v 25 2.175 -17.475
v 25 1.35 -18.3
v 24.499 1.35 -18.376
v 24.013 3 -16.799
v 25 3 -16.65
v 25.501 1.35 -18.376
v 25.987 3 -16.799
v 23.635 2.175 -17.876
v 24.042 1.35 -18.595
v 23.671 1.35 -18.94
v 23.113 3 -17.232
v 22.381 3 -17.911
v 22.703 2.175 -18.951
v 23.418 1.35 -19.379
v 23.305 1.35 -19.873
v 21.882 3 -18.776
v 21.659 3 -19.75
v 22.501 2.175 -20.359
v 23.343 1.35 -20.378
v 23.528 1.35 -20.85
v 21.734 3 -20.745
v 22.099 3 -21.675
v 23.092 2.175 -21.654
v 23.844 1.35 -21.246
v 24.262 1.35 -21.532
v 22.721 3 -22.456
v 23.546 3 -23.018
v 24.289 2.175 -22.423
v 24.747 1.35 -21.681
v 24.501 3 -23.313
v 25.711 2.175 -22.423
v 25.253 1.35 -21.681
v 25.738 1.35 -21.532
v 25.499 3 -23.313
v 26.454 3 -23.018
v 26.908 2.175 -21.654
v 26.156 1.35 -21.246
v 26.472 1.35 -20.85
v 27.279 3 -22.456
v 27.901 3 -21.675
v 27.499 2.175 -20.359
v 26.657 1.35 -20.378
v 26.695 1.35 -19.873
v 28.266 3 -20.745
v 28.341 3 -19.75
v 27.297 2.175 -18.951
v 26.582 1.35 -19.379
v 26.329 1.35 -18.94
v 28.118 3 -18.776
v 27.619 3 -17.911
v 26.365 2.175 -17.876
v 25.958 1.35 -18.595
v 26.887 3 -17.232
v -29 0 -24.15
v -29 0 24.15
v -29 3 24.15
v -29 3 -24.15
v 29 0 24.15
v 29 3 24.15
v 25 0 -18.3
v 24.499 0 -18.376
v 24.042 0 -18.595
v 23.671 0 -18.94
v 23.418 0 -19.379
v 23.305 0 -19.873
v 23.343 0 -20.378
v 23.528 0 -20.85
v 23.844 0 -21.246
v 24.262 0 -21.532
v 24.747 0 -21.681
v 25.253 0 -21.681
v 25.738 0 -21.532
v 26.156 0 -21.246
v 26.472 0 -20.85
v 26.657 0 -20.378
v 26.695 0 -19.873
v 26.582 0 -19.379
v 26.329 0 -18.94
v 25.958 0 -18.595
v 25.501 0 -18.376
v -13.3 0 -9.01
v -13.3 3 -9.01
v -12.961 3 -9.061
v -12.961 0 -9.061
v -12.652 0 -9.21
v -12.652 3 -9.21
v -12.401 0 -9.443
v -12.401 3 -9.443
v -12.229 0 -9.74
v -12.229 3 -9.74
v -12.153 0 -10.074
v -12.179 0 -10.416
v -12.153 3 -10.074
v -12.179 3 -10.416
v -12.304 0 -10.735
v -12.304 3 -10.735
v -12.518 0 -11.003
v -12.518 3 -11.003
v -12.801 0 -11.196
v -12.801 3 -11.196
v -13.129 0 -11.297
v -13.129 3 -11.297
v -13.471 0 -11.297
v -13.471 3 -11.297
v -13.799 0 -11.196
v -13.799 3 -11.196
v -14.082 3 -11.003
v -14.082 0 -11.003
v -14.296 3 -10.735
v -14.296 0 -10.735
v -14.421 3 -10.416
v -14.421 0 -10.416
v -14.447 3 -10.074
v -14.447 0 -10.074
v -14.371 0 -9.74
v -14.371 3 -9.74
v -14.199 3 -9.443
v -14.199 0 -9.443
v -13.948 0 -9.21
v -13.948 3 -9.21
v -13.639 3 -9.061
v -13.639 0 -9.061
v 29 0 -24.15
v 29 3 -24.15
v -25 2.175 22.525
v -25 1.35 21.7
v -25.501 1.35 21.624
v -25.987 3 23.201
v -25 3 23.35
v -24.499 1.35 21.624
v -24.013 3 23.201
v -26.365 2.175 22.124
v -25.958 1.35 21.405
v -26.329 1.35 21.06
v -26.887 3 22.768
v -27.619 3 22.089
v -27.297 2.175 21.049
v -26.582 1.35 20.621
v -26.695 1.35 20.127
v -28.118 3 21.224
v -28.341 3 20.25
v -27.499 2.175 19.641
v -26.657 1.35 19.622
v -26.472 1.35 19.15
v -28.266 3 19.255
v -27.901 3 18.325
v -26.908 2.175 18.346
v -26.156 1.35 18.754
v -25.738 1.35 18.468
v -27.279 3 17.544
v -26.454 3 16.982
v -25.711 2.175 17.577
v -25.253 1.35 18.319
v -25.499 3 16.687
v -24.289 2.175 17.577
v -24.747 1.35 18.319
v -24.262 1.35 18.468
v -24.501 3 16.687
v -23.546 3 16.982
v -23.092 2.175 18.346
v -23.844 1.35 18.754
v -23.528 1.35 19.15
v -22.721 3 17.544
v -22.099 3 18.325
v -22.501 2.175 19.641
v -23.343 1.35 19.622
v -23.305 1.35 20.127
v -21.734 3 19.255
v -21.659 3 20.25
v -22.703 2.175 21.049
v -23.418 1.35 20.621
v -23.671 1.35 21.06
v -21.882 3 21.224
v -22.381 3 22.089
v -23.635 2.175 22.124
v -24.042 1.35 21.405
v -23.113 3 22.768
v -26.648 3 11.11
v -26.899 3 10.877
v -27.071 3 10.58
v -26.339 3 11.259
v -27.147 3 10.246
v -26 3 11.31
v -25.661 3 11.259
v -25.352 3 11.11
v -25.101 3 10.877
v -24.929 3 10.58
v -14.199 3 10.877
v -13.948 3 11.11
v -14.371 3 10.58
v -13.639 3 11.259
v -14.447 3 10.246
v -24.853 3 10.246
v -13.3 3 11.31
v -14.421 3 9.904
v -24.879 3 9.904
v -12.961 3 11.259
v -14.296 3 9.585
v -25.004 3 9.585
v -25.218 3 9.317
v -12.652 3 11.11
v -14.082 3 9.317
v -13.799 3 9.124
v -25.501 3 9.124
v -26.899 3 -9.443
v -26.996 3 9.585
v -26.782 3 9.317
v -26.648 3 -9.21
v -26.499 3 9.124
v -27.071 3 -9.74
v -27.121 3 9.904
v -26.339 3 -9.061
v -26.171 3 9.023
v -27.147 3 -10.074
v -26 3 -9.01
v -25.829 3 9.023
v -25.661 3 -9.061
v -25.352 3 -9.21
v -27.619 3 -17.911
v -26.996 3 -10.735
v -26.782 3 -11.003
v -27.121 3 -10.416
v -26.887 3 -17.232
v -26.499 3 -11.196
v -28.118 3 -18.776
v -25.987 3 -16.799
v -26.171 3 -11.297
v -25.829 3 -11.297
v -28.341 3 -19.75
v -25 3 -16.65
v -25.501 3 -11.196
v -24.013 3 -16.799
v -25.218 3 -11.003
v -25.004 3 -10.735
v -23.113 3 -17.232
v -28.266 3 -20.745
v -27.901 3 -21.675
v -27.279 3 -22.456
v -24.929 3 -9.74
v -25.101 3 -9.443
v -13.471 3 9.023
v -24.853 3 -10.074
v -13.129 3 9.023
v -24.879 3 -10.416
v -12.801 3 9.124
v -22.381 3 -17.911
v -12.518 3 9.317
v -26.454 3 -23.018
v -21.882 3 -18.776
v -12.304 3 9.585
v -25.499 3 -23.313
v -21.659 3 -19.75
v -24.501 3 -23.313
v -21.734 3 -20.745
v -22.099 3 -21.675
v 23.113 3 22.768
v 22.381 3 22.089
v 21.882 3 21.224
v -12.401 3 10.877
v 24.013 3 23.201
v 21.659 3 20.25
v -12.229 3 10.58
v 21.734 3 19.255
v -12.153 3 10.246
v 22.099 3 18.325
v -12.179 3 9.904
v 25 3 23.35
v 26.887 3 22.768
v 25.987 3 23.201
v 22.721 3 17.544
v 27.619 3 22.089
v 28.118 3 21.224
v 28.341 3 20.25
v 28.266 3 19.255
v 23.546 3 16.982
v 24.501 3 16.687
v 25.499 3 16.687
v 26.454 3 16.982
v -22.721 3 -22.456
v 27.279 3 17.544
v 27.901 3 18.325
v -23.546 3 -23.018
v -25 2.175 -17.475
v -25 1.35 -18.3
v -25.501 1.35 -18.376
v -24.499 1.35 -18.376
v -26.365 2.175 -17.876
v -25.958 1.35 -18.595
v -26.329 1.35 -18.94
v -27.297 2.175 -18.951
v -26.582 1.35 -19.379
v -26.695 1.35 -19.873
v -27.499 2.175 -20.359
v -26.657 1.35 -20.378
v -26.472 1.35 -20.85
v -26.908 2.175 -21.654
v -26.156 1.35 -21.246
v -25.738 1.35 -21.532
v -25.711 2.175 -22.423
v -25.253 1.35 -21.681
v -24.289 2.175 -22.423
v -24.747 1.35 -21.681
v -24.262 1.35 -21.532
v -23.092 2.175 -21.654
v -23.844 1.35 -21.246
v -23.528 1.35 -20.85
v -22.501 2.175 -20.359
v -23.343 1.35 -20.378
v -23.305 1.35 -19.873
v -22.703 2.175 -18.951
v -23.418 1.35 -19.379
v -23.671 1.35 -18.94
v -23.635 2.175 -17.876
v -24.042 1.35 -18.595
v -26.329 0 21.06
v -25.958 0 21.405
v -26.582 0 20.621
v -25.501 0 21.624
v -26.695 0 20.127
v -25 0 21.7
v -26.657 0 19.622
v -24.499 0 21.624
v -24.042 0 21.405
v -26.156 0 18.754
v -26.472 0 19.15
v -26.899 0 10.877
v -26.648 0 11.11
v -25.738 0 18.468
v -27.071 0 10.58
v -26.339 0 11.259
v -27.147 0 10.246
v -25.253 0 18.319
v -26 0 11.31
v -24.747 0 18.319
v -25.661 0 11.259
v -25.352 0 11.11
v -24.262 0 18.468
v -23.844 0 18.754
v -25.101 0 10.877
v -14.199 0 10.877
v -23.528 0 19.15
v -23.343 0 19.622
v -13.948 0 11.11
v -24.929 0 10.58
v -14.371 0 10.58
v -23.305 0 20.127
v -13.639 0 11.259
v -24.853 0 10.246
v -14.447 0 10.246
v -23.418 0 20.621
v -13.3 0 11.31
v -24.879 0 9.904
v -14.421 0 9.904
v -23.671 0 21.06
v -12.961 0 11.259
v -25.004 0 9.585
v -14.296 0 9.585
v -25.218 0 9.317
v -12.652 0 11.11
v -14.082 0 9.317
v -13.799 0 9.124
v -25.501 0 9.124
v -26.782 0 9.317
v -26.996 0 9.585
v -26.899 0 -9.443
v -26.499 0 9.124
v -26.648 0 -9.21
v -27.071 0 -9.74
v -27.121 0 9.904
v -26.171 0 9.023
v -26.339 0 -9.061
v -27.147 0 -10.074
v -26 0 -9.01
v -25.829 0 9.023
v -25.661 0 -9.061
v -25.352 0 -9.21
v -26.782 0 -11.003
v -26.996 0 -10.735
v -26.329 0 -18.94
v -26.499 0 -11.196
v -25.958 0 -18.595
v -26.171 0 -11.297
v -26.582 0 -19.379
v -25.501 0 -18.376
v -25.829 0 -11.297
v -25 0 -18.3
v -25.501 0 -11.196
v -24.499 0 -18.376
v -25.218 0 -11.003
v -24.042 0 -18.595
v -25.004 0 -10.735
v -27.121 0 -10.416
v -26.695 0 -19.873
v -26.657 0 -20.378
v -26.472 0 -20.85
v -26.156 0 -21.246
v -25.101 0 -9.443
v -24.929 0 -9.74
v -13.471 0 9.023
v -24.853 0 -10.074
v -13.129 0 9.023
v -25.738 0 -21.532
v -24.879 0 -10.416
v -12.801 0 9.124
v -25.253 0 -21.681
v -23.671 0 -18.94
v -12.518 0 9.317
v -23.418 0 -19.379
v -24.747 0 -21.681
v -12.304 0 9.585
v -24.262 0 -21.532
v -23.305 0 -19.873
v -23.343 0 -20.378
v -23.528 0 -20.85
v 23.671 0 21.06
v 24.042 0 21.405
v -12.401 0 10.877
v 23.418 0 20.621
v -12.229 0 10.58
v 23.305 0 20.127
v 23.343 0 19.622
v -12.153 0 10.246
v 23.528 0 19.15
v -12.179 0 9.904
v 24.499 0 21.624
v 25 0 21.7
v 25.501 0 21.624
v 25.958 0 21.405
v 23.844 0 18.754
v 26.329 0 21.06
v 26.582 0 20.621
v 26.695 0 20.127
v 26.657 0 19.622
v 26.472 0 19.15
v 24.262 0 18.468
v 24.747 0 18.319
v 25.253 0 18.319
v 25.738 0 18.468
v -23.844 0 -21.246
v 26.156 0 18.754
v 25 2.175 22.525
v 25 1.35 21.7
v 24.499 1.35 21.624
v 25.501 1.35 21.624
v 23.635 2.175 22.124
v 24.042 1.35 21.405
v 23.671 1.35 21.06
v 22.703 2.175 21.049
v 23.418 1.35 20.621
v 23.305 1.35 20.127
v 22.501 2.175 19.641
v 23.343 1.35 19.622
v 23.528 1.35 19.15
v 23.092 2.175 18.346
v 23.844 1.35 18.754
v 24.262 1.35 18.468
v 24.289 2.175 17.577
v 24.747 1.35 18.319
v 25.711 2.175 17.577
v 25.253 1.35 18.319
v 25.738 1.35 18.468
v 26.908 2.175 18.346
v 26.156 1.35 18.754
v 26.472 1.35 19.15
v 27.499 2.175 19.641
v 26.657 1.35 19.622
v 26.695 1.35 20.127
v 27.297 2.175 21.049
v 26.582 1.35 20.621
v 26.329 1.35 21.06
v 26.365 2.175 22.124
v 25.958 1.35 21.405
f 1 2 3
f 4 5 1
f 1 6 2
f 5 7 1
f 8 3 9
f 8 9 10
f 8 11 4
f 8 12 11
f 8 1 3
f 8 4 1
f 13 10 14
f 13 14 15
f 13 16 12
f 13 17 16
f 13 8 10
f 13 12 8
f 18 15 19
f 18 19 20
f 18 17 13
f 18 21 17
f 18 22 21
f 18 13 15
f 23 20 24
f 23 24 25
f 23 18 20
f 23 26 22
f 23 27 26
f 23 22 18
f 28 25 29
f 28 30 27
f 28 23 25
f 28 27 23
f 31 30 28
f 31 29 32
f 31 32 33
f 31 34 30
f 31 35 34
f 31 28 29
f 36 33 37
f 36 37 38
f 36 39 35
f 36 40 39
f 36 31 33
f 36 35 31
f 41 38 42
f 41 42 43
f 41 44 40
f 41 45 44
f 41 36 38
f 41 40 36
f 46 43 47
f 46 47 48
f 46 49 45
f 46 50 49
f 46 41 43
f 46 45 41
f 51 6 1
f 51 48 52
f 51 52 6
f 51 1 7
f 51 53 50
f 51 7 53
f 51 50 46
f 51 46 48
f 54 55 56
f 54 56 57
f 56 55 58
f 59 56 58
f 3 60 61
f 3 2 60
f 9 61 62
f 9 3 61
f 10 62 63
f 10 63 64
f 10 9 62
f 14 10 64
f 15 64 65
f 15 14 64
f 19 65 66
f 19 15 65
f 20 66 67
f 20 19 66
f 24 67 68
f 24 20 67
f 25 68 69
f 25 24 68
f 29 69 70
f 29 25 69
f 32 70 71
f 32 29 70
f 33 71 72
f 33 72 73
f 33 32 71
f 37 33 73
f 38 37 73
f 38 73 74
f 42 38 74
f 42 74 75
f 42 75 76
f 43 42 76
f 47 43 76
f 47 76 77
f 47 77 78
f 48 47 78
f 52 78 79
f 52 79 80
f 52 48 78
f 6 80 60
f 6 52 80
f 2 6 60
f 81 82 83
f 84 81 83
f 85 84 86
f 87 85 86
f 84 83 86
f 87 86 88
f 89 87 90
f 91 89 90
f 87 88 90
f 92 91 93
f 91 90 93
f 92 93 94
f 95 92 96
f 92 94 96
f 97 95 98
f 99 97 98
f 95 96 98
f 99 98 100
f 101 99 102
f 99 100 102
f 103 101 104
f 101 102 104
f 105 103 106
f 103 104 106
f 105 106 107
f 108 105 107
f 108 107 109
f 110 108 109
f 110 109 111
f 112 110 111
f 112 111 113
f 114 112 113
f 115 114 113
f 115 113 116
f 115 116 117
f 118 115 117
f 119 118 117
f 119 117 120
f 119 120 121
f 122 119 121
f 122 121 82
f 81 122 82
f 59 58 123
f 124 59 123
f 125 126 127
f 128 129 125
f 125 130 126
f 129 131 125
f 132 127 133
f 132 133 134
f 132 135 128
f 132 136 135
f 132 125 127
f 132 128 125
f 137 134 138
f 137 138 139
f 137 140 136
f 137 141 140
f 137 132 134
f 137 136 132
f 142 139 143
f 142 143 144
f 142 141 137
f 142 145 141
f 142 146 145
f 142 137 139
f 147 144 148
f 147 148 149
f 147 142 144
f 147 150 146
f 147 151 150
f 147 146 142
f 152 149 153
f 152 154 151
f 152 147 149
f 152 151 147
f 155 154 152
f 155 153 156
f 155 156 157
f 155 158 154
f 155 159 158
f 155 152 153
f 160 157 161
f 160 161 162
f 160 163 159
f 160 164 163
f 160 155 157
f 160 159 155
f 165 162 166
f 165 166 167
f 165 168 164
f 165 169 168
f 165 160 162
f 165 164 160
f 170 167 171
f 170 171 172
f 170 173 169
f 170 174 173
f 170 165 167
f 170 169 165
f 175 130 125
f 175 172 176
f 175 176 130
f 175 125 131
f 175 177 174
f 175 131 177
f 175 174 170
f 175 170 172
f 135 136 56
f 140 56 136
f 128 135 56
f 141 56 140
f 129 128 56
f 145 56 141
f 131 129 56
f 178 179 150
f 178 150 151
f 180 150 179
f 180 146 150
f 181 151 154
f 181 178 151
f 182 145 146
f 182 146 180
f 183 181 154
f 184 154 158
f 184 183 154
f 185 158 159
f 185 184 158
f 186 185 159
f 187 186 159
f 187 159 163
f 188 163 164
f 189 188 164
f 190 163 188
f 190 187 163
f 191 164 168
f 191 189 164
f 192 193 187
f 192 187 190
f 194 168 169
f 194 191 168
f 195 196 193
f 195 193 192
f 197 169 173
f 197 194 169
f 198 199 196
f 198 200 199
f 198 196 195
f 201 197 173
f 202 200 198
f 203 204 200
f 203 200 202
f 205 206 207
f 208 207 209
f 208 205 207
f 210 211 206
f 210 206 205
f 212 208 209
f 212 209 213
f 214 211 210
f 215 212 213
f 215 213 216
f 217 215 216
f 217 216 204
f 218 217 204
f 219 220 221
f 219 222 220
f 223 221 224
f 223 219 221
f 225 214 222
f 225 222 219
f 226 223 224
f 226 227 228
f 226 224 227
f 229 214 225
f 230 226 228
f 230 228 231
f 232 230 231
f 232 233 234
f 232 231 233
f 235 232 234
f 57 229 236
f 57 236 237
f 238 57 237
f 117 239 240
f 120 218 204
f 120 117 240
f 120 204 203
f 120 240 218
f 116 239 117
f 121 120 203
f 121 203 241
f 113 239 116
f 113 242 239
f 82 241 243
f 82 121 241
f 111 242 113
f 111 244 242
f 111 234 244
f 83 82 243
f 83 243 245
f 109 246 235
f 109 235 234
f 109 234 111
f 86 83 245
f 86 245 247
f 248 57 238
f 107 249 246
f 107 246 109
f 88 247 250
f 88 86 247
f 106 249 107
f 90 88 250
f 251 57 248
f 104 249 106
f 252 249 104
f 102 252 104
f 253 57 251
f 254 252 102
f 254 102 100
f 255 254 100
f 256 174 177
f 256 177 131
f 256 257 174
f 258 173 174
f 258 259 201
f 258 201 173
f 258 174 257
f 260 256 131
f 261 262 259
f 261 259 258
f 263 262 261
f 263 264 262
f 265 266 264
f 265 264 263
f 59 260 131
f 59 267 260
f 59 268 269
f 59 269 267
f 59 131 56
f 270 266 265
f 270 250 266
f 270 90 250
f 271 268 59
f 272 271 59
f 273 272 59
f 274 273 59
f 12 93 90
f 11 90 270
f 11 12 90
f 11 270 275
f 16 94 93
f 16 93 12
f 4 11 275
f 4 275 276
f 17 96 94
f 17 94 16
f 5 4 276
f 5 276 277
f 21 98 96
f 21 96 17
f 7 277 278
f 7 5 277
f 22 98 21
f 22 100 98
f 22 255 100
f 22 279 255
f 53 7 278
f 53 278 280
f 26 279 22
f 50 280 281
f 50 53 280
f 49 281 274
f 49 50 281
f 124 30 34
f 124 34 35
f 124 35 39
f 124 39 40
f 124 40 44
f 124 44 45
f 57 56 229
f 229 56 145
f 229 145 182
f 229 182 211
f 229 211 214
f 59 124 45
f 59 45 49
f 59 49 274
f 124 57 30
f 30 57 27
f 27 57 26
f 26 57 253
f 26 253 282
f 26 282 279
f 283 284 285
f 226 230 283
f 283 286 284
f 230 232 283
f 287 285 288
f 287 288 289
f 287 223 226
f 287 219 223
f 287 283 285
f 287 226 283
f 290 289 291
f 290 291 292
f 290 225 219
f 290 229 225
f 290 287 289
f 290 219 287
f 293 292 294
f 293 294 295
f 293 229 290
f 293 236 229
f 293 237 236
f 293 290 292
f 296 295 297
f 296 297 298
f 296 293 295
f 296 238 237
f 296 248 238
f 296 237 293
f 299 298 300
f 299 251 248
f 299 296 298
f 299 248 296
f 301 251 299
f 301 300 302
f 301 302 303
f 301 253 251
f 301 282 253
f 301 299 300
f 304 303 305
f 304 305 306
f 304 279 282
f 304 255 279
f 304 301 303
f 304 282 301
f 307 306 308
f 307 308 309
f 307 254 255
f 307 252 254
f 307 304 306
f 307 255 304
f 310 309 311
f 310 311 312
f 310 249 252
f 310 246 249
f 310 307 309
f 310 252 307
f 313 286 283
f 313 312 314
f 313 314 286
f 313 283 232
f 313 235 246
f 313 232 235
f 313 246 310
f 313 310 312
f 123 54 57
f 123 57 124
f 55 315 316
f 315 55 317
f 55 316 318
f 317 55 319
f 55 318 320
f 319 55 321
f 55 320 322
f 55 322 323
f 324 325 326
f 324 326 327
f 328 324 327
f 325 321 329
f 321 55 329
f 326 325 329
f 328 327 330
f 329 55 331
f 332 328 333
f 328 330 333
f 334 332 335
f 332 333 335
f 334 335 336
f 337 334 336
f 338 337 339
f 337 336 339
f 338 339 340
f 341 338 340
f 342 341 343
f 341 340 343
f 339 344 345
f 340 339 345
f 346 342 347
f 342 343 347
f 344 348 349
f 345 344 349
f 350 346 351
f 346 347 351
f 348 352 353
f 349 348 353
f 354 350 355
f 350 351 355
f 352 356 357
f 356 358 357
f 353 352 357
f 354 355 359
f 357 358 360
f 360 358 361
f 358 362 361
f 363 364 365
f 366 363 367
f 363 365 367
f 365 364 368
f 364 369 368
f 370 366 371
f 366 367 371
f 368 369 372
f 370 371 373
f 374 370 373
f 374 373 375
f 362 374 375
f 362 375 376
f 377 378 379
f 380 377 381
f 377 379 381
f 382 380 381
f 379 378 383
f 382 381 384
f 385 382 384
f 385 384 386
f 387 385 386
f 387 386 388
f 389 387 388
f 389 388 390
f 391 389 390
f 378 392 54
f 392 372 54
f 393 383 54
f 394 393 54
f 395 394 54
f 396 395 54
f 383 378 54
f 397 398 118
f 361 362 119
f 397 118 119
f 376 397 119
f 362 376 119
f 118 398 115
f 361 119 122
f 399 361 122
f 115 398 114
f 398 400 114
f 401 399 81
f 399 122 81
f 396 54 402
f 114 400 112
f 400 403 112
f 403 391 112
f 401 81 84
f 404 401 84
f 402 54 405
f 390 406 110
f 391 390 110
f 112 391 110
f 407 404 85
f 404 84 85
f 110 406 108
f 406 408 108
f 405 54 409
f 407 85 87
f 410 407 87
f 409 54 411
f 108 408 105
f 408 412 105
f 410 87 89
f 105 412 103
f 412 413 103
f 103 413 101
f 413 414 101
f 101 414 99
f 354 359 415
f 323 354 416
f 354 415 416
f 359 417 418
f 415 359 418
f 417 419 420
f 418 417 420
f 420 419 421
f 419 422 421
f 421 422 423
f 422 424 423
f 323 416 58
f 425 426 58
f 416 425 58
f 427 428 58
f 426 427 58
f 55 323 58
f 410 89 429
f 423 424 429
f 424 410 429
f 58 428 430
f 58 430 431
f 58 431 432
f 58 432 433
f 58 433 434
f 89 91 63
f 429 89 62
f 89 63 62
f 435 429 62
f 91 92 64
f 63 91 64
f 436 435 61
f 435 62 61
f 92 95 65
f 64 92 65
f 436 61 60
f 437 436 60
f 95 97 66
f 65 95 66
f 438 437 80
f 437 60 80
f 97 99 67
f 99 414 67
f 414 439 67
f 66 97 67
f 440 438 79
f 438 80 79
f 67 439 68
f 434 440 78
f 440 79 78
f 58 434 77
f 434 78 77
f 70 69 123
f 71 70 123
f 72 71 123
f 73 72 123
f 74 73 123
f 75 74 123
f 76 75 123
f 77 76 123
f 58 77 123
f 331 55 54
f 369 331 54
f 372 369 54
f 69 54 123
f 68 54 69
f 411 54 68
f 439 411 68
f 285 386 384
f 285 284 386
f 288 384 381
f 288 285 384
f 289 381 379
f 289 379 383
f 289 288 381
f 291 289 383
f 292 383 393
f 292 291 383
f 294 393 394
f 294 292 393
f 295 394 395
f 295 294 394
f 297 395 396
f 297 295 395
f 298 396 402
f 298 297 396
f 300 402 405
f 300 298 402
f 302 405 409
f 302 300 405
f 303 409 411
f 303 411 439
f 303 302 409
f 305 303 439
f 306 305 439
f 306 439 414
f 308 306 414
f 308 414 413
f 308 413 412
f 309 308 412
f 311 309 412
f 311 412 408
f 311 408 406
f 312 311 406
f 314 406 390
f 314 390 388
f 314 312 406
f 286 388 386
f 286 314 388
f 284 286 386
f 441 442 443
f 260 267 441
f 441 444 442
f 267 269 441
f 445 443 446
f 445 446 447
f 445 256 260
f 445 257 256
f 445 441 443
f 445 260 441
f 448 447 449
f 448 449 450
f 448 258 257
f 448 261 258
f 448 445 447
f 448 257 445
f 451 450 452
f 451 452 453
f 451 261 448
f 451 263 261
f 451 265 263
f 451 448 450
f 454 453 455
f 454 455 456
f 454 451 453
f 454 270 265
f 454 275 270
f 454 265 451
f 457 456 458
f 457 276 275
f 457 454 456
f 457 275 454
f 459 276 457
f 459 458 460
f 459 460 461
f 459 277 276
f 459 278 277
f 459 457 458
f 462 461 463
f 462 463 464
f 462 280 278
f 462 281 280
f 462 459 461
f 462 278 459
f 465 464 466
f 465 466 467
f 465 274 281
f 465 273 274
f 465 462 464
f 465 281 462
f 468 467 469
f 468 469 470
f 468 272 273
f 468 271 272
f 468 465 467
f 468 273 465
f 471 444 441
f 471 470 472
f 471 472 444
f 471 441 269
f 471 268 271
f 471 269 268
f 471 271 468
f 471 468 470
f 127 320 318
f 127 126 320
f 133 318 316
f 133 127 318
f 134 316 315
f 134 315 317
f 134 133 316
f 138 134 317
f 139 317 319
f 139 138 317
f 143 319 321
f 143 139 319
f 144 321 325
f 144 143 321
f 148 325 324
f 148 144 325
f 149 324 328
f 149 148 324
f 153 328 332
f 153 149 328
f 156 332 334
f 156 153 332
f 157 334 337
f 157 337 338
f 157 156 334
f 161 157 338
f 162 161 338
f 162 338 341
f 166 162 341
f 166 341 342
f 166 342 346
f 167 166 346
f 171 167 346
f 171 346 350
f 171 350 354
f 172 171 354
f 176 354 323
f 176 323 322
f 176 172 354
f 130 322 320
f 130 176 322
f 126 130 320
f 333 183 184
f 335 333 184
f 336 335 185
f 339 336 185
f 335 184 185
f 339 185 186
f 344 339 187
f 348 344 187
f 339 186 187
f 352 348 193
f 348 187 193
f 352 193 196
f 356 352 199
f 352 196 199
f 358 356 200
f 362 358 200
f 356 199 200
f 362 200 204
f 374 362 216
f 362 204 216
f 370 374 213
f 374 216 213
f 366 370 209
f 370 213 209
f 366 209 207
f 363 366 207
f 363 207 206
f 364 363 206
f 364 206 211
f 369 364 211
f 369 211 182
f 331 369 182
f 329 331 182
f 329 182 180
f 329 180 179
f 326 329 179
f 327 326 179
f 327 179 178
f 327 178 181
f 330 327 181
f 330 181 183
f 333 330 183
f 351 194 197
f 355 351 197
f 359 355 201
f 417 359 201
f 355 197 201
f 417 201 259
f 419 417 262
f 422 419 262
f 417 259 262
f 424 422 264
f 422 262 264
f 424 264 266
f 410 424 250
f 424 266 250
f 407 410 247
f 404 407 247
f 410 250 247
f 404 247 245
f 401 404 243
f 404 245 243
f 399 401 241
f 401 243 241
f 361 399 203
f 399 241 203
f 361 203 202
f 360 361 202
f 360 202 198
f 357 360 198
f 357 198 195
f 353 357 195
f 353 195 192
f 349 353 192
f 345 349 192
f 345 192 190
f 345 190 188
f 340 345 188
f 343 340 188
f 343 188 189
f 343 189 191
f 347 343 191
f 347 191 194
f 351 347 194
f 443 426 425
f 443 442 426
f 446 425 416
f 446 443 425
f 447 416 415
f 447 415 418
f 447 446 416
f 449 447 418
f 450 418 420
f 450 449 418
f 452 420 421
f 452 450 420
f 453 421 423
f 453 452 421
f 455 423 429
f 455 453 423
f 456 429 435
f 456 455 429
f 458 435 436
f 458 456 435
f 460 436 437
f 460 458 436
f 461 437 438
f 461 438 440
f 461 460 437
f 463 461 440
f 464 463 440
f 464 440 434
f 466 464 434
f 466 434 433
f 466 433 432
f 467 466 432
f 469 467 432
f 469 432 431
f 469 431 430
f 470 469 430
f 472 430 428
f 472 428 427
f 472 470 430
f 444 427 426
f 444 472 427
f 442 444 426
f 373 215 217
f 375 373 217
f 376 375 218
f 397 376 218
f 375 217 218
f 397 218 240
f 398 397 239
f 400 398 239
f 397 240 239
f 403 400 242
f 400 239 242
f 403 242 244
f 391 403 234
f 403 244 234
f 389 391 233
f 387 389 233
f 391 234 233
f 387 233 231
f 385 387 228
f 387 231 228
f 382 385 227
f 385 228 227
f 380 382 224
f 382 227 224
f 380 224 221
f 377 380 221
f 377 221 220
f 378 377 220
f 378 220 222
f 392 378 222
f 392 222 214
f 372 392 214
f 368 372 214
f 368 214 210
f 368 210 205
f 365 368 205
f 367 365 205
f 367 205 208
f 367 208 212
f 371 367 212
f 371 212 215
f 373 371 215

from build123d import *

# Parameters (mm, degrees)
SKETCH1_W                                      = 58
SKETCH1_H                                      = 48.3
BOSS_EXTRUDE1_DEPTH                            = 3
CSK_FOR_M3_FLAT_HEAD_MACHINE_SCREW1_AT_2_COUNT = 2
CSK_FOR_M3_FLAT_HEAD_MACHINE_SCREW1_AT_2_PITCH = 40
CSK_FOR_M3_FLAT_HEAD_MACHINE_SCREW1_AT_3_COUNT = 2
CSK_FOR_M3_FLAT_HEAD_MACHINE_SCREW1_AT_3_PITCH = 50
CSK_FOR_M3_FLAT_HEAD_MACHINE_SCREW1_AT_4_COUNT = 2
CSK_FOR_M3_FLAT_HEAD_MACHINE_SCREW1_AT_4_PITCH = 64.031242374
SKETCH6_R                                      = 1.15
CUT_EXTRUDE1_DEPTH                             = 10


with BuildPart() as part:
    # Sketch1 → Boss-Extrude1 (new body)
    with BuildSketch(Plane(origin=(0, 0, 0), x_dir=(1, 0, 0), z_dir=(0, 1, 0))):
        Rectangle(SKETCH1_W, SKETCH1_H)
    extrude(amount=BOSS_EXTRUDE1_DEPTH)

    # Sketch3 → CSK for M3 Flat Head Machine Screw1 (revolve, cut)
    with BuildSketch(Plane(origin=(25, 3, 20), x_dir=(0, 0, 1), z_dir=(1, 0, 0))):
        Polygon((0, 0), (0, 3), (1.7, 3), (1.7, 1.65), (3.35, 0), align=None)
    csk_for_m3_flat_head_machine_screw1 = revolve(axis=Axis((25, 9.35, 20), (0, -1, 0)), mode=Mode.SUBTRACT)

    # CSK for M3 Flat Head Machine Screw1 at 2: CSK for M3 Flat Head Machine Screw1 ×2
    with Locations(*[(0, 0, -i * CSK_FOR_M3_FLAT_HEAD_MACHINE_SCREW1_AT_2_PITCH) for i in range(1, CSK_FOR_M3_FLAT_HEAD_MACHINE_SCREW1_AT_2_COUNT)]):
        add(csk_for_m3_flat_head_machine_screw1, mode=Mode.SUBTRACT)

    # CSK for M3 Flat Head Machine Screw1 at 3: CSK for M3 Flat Head Machine Screw1 ×2
    with Locations(*[(-i * CSK_FOR_M3_FLAT_HEAD_MACHINE_SCREW1_AT_3_PITCH, 0, 0) for i in range(1, CSK_FOR_M3_FLAT_HEAD_MACHINE_SCREW1_AT_3_COUNT)]):
        add(csk_for_m3_flat_head_machine_screw1, mode=Mode.SUBTRACT)

    # CSK for M3 Flat Head Machine Screw1 at 4: CSK for M3 Flat Head Machine Screw1 ×2
    with Locations(*[Vector(-0.7808688094430304, 0, -0.6246950475544243) * (i * CSK_FOR_M3_FLAT_HEAD_MACHINE_SCREW1_AT_4_PITCH) for i in range(1, CSK_FOR_M3_FLAT_HEAD_MACHINE_SCREW1_AT_4_COUNT)]):
        add(csk_for_m3_flat_head_machine_screw1, mode=Mode.SUBTRACT)

    # Sketch6 → Cut-Extrude1 (cut)
    with BuildSketch(Plane(origin=(0, 3, 0), x_dir=(1, 0, 0), z_dir=(0, 1, 0))):
        with Locations(Location((-26, 10.16, 0), (0, 0, 270))):
            Circle(SKETCH6_R)
        with Locations(Location((-13.3, 10.16, 0), (0, 0, 270))):
            Circle(SKETCH6_R)
        with Locations(Location((-13.3, -10.16, 0), (0, 0, 270))):
            Circle(SKETCH6_R)
        with Locations(Location((-26, -10.16, 0), (0, 0, 270))):
            Circle(SKETCH6_R)
    extrude(amount=-CUT_EXTRUDE1_DEPTH, mode=Mode.SUBTRACT)


solid = part.part
